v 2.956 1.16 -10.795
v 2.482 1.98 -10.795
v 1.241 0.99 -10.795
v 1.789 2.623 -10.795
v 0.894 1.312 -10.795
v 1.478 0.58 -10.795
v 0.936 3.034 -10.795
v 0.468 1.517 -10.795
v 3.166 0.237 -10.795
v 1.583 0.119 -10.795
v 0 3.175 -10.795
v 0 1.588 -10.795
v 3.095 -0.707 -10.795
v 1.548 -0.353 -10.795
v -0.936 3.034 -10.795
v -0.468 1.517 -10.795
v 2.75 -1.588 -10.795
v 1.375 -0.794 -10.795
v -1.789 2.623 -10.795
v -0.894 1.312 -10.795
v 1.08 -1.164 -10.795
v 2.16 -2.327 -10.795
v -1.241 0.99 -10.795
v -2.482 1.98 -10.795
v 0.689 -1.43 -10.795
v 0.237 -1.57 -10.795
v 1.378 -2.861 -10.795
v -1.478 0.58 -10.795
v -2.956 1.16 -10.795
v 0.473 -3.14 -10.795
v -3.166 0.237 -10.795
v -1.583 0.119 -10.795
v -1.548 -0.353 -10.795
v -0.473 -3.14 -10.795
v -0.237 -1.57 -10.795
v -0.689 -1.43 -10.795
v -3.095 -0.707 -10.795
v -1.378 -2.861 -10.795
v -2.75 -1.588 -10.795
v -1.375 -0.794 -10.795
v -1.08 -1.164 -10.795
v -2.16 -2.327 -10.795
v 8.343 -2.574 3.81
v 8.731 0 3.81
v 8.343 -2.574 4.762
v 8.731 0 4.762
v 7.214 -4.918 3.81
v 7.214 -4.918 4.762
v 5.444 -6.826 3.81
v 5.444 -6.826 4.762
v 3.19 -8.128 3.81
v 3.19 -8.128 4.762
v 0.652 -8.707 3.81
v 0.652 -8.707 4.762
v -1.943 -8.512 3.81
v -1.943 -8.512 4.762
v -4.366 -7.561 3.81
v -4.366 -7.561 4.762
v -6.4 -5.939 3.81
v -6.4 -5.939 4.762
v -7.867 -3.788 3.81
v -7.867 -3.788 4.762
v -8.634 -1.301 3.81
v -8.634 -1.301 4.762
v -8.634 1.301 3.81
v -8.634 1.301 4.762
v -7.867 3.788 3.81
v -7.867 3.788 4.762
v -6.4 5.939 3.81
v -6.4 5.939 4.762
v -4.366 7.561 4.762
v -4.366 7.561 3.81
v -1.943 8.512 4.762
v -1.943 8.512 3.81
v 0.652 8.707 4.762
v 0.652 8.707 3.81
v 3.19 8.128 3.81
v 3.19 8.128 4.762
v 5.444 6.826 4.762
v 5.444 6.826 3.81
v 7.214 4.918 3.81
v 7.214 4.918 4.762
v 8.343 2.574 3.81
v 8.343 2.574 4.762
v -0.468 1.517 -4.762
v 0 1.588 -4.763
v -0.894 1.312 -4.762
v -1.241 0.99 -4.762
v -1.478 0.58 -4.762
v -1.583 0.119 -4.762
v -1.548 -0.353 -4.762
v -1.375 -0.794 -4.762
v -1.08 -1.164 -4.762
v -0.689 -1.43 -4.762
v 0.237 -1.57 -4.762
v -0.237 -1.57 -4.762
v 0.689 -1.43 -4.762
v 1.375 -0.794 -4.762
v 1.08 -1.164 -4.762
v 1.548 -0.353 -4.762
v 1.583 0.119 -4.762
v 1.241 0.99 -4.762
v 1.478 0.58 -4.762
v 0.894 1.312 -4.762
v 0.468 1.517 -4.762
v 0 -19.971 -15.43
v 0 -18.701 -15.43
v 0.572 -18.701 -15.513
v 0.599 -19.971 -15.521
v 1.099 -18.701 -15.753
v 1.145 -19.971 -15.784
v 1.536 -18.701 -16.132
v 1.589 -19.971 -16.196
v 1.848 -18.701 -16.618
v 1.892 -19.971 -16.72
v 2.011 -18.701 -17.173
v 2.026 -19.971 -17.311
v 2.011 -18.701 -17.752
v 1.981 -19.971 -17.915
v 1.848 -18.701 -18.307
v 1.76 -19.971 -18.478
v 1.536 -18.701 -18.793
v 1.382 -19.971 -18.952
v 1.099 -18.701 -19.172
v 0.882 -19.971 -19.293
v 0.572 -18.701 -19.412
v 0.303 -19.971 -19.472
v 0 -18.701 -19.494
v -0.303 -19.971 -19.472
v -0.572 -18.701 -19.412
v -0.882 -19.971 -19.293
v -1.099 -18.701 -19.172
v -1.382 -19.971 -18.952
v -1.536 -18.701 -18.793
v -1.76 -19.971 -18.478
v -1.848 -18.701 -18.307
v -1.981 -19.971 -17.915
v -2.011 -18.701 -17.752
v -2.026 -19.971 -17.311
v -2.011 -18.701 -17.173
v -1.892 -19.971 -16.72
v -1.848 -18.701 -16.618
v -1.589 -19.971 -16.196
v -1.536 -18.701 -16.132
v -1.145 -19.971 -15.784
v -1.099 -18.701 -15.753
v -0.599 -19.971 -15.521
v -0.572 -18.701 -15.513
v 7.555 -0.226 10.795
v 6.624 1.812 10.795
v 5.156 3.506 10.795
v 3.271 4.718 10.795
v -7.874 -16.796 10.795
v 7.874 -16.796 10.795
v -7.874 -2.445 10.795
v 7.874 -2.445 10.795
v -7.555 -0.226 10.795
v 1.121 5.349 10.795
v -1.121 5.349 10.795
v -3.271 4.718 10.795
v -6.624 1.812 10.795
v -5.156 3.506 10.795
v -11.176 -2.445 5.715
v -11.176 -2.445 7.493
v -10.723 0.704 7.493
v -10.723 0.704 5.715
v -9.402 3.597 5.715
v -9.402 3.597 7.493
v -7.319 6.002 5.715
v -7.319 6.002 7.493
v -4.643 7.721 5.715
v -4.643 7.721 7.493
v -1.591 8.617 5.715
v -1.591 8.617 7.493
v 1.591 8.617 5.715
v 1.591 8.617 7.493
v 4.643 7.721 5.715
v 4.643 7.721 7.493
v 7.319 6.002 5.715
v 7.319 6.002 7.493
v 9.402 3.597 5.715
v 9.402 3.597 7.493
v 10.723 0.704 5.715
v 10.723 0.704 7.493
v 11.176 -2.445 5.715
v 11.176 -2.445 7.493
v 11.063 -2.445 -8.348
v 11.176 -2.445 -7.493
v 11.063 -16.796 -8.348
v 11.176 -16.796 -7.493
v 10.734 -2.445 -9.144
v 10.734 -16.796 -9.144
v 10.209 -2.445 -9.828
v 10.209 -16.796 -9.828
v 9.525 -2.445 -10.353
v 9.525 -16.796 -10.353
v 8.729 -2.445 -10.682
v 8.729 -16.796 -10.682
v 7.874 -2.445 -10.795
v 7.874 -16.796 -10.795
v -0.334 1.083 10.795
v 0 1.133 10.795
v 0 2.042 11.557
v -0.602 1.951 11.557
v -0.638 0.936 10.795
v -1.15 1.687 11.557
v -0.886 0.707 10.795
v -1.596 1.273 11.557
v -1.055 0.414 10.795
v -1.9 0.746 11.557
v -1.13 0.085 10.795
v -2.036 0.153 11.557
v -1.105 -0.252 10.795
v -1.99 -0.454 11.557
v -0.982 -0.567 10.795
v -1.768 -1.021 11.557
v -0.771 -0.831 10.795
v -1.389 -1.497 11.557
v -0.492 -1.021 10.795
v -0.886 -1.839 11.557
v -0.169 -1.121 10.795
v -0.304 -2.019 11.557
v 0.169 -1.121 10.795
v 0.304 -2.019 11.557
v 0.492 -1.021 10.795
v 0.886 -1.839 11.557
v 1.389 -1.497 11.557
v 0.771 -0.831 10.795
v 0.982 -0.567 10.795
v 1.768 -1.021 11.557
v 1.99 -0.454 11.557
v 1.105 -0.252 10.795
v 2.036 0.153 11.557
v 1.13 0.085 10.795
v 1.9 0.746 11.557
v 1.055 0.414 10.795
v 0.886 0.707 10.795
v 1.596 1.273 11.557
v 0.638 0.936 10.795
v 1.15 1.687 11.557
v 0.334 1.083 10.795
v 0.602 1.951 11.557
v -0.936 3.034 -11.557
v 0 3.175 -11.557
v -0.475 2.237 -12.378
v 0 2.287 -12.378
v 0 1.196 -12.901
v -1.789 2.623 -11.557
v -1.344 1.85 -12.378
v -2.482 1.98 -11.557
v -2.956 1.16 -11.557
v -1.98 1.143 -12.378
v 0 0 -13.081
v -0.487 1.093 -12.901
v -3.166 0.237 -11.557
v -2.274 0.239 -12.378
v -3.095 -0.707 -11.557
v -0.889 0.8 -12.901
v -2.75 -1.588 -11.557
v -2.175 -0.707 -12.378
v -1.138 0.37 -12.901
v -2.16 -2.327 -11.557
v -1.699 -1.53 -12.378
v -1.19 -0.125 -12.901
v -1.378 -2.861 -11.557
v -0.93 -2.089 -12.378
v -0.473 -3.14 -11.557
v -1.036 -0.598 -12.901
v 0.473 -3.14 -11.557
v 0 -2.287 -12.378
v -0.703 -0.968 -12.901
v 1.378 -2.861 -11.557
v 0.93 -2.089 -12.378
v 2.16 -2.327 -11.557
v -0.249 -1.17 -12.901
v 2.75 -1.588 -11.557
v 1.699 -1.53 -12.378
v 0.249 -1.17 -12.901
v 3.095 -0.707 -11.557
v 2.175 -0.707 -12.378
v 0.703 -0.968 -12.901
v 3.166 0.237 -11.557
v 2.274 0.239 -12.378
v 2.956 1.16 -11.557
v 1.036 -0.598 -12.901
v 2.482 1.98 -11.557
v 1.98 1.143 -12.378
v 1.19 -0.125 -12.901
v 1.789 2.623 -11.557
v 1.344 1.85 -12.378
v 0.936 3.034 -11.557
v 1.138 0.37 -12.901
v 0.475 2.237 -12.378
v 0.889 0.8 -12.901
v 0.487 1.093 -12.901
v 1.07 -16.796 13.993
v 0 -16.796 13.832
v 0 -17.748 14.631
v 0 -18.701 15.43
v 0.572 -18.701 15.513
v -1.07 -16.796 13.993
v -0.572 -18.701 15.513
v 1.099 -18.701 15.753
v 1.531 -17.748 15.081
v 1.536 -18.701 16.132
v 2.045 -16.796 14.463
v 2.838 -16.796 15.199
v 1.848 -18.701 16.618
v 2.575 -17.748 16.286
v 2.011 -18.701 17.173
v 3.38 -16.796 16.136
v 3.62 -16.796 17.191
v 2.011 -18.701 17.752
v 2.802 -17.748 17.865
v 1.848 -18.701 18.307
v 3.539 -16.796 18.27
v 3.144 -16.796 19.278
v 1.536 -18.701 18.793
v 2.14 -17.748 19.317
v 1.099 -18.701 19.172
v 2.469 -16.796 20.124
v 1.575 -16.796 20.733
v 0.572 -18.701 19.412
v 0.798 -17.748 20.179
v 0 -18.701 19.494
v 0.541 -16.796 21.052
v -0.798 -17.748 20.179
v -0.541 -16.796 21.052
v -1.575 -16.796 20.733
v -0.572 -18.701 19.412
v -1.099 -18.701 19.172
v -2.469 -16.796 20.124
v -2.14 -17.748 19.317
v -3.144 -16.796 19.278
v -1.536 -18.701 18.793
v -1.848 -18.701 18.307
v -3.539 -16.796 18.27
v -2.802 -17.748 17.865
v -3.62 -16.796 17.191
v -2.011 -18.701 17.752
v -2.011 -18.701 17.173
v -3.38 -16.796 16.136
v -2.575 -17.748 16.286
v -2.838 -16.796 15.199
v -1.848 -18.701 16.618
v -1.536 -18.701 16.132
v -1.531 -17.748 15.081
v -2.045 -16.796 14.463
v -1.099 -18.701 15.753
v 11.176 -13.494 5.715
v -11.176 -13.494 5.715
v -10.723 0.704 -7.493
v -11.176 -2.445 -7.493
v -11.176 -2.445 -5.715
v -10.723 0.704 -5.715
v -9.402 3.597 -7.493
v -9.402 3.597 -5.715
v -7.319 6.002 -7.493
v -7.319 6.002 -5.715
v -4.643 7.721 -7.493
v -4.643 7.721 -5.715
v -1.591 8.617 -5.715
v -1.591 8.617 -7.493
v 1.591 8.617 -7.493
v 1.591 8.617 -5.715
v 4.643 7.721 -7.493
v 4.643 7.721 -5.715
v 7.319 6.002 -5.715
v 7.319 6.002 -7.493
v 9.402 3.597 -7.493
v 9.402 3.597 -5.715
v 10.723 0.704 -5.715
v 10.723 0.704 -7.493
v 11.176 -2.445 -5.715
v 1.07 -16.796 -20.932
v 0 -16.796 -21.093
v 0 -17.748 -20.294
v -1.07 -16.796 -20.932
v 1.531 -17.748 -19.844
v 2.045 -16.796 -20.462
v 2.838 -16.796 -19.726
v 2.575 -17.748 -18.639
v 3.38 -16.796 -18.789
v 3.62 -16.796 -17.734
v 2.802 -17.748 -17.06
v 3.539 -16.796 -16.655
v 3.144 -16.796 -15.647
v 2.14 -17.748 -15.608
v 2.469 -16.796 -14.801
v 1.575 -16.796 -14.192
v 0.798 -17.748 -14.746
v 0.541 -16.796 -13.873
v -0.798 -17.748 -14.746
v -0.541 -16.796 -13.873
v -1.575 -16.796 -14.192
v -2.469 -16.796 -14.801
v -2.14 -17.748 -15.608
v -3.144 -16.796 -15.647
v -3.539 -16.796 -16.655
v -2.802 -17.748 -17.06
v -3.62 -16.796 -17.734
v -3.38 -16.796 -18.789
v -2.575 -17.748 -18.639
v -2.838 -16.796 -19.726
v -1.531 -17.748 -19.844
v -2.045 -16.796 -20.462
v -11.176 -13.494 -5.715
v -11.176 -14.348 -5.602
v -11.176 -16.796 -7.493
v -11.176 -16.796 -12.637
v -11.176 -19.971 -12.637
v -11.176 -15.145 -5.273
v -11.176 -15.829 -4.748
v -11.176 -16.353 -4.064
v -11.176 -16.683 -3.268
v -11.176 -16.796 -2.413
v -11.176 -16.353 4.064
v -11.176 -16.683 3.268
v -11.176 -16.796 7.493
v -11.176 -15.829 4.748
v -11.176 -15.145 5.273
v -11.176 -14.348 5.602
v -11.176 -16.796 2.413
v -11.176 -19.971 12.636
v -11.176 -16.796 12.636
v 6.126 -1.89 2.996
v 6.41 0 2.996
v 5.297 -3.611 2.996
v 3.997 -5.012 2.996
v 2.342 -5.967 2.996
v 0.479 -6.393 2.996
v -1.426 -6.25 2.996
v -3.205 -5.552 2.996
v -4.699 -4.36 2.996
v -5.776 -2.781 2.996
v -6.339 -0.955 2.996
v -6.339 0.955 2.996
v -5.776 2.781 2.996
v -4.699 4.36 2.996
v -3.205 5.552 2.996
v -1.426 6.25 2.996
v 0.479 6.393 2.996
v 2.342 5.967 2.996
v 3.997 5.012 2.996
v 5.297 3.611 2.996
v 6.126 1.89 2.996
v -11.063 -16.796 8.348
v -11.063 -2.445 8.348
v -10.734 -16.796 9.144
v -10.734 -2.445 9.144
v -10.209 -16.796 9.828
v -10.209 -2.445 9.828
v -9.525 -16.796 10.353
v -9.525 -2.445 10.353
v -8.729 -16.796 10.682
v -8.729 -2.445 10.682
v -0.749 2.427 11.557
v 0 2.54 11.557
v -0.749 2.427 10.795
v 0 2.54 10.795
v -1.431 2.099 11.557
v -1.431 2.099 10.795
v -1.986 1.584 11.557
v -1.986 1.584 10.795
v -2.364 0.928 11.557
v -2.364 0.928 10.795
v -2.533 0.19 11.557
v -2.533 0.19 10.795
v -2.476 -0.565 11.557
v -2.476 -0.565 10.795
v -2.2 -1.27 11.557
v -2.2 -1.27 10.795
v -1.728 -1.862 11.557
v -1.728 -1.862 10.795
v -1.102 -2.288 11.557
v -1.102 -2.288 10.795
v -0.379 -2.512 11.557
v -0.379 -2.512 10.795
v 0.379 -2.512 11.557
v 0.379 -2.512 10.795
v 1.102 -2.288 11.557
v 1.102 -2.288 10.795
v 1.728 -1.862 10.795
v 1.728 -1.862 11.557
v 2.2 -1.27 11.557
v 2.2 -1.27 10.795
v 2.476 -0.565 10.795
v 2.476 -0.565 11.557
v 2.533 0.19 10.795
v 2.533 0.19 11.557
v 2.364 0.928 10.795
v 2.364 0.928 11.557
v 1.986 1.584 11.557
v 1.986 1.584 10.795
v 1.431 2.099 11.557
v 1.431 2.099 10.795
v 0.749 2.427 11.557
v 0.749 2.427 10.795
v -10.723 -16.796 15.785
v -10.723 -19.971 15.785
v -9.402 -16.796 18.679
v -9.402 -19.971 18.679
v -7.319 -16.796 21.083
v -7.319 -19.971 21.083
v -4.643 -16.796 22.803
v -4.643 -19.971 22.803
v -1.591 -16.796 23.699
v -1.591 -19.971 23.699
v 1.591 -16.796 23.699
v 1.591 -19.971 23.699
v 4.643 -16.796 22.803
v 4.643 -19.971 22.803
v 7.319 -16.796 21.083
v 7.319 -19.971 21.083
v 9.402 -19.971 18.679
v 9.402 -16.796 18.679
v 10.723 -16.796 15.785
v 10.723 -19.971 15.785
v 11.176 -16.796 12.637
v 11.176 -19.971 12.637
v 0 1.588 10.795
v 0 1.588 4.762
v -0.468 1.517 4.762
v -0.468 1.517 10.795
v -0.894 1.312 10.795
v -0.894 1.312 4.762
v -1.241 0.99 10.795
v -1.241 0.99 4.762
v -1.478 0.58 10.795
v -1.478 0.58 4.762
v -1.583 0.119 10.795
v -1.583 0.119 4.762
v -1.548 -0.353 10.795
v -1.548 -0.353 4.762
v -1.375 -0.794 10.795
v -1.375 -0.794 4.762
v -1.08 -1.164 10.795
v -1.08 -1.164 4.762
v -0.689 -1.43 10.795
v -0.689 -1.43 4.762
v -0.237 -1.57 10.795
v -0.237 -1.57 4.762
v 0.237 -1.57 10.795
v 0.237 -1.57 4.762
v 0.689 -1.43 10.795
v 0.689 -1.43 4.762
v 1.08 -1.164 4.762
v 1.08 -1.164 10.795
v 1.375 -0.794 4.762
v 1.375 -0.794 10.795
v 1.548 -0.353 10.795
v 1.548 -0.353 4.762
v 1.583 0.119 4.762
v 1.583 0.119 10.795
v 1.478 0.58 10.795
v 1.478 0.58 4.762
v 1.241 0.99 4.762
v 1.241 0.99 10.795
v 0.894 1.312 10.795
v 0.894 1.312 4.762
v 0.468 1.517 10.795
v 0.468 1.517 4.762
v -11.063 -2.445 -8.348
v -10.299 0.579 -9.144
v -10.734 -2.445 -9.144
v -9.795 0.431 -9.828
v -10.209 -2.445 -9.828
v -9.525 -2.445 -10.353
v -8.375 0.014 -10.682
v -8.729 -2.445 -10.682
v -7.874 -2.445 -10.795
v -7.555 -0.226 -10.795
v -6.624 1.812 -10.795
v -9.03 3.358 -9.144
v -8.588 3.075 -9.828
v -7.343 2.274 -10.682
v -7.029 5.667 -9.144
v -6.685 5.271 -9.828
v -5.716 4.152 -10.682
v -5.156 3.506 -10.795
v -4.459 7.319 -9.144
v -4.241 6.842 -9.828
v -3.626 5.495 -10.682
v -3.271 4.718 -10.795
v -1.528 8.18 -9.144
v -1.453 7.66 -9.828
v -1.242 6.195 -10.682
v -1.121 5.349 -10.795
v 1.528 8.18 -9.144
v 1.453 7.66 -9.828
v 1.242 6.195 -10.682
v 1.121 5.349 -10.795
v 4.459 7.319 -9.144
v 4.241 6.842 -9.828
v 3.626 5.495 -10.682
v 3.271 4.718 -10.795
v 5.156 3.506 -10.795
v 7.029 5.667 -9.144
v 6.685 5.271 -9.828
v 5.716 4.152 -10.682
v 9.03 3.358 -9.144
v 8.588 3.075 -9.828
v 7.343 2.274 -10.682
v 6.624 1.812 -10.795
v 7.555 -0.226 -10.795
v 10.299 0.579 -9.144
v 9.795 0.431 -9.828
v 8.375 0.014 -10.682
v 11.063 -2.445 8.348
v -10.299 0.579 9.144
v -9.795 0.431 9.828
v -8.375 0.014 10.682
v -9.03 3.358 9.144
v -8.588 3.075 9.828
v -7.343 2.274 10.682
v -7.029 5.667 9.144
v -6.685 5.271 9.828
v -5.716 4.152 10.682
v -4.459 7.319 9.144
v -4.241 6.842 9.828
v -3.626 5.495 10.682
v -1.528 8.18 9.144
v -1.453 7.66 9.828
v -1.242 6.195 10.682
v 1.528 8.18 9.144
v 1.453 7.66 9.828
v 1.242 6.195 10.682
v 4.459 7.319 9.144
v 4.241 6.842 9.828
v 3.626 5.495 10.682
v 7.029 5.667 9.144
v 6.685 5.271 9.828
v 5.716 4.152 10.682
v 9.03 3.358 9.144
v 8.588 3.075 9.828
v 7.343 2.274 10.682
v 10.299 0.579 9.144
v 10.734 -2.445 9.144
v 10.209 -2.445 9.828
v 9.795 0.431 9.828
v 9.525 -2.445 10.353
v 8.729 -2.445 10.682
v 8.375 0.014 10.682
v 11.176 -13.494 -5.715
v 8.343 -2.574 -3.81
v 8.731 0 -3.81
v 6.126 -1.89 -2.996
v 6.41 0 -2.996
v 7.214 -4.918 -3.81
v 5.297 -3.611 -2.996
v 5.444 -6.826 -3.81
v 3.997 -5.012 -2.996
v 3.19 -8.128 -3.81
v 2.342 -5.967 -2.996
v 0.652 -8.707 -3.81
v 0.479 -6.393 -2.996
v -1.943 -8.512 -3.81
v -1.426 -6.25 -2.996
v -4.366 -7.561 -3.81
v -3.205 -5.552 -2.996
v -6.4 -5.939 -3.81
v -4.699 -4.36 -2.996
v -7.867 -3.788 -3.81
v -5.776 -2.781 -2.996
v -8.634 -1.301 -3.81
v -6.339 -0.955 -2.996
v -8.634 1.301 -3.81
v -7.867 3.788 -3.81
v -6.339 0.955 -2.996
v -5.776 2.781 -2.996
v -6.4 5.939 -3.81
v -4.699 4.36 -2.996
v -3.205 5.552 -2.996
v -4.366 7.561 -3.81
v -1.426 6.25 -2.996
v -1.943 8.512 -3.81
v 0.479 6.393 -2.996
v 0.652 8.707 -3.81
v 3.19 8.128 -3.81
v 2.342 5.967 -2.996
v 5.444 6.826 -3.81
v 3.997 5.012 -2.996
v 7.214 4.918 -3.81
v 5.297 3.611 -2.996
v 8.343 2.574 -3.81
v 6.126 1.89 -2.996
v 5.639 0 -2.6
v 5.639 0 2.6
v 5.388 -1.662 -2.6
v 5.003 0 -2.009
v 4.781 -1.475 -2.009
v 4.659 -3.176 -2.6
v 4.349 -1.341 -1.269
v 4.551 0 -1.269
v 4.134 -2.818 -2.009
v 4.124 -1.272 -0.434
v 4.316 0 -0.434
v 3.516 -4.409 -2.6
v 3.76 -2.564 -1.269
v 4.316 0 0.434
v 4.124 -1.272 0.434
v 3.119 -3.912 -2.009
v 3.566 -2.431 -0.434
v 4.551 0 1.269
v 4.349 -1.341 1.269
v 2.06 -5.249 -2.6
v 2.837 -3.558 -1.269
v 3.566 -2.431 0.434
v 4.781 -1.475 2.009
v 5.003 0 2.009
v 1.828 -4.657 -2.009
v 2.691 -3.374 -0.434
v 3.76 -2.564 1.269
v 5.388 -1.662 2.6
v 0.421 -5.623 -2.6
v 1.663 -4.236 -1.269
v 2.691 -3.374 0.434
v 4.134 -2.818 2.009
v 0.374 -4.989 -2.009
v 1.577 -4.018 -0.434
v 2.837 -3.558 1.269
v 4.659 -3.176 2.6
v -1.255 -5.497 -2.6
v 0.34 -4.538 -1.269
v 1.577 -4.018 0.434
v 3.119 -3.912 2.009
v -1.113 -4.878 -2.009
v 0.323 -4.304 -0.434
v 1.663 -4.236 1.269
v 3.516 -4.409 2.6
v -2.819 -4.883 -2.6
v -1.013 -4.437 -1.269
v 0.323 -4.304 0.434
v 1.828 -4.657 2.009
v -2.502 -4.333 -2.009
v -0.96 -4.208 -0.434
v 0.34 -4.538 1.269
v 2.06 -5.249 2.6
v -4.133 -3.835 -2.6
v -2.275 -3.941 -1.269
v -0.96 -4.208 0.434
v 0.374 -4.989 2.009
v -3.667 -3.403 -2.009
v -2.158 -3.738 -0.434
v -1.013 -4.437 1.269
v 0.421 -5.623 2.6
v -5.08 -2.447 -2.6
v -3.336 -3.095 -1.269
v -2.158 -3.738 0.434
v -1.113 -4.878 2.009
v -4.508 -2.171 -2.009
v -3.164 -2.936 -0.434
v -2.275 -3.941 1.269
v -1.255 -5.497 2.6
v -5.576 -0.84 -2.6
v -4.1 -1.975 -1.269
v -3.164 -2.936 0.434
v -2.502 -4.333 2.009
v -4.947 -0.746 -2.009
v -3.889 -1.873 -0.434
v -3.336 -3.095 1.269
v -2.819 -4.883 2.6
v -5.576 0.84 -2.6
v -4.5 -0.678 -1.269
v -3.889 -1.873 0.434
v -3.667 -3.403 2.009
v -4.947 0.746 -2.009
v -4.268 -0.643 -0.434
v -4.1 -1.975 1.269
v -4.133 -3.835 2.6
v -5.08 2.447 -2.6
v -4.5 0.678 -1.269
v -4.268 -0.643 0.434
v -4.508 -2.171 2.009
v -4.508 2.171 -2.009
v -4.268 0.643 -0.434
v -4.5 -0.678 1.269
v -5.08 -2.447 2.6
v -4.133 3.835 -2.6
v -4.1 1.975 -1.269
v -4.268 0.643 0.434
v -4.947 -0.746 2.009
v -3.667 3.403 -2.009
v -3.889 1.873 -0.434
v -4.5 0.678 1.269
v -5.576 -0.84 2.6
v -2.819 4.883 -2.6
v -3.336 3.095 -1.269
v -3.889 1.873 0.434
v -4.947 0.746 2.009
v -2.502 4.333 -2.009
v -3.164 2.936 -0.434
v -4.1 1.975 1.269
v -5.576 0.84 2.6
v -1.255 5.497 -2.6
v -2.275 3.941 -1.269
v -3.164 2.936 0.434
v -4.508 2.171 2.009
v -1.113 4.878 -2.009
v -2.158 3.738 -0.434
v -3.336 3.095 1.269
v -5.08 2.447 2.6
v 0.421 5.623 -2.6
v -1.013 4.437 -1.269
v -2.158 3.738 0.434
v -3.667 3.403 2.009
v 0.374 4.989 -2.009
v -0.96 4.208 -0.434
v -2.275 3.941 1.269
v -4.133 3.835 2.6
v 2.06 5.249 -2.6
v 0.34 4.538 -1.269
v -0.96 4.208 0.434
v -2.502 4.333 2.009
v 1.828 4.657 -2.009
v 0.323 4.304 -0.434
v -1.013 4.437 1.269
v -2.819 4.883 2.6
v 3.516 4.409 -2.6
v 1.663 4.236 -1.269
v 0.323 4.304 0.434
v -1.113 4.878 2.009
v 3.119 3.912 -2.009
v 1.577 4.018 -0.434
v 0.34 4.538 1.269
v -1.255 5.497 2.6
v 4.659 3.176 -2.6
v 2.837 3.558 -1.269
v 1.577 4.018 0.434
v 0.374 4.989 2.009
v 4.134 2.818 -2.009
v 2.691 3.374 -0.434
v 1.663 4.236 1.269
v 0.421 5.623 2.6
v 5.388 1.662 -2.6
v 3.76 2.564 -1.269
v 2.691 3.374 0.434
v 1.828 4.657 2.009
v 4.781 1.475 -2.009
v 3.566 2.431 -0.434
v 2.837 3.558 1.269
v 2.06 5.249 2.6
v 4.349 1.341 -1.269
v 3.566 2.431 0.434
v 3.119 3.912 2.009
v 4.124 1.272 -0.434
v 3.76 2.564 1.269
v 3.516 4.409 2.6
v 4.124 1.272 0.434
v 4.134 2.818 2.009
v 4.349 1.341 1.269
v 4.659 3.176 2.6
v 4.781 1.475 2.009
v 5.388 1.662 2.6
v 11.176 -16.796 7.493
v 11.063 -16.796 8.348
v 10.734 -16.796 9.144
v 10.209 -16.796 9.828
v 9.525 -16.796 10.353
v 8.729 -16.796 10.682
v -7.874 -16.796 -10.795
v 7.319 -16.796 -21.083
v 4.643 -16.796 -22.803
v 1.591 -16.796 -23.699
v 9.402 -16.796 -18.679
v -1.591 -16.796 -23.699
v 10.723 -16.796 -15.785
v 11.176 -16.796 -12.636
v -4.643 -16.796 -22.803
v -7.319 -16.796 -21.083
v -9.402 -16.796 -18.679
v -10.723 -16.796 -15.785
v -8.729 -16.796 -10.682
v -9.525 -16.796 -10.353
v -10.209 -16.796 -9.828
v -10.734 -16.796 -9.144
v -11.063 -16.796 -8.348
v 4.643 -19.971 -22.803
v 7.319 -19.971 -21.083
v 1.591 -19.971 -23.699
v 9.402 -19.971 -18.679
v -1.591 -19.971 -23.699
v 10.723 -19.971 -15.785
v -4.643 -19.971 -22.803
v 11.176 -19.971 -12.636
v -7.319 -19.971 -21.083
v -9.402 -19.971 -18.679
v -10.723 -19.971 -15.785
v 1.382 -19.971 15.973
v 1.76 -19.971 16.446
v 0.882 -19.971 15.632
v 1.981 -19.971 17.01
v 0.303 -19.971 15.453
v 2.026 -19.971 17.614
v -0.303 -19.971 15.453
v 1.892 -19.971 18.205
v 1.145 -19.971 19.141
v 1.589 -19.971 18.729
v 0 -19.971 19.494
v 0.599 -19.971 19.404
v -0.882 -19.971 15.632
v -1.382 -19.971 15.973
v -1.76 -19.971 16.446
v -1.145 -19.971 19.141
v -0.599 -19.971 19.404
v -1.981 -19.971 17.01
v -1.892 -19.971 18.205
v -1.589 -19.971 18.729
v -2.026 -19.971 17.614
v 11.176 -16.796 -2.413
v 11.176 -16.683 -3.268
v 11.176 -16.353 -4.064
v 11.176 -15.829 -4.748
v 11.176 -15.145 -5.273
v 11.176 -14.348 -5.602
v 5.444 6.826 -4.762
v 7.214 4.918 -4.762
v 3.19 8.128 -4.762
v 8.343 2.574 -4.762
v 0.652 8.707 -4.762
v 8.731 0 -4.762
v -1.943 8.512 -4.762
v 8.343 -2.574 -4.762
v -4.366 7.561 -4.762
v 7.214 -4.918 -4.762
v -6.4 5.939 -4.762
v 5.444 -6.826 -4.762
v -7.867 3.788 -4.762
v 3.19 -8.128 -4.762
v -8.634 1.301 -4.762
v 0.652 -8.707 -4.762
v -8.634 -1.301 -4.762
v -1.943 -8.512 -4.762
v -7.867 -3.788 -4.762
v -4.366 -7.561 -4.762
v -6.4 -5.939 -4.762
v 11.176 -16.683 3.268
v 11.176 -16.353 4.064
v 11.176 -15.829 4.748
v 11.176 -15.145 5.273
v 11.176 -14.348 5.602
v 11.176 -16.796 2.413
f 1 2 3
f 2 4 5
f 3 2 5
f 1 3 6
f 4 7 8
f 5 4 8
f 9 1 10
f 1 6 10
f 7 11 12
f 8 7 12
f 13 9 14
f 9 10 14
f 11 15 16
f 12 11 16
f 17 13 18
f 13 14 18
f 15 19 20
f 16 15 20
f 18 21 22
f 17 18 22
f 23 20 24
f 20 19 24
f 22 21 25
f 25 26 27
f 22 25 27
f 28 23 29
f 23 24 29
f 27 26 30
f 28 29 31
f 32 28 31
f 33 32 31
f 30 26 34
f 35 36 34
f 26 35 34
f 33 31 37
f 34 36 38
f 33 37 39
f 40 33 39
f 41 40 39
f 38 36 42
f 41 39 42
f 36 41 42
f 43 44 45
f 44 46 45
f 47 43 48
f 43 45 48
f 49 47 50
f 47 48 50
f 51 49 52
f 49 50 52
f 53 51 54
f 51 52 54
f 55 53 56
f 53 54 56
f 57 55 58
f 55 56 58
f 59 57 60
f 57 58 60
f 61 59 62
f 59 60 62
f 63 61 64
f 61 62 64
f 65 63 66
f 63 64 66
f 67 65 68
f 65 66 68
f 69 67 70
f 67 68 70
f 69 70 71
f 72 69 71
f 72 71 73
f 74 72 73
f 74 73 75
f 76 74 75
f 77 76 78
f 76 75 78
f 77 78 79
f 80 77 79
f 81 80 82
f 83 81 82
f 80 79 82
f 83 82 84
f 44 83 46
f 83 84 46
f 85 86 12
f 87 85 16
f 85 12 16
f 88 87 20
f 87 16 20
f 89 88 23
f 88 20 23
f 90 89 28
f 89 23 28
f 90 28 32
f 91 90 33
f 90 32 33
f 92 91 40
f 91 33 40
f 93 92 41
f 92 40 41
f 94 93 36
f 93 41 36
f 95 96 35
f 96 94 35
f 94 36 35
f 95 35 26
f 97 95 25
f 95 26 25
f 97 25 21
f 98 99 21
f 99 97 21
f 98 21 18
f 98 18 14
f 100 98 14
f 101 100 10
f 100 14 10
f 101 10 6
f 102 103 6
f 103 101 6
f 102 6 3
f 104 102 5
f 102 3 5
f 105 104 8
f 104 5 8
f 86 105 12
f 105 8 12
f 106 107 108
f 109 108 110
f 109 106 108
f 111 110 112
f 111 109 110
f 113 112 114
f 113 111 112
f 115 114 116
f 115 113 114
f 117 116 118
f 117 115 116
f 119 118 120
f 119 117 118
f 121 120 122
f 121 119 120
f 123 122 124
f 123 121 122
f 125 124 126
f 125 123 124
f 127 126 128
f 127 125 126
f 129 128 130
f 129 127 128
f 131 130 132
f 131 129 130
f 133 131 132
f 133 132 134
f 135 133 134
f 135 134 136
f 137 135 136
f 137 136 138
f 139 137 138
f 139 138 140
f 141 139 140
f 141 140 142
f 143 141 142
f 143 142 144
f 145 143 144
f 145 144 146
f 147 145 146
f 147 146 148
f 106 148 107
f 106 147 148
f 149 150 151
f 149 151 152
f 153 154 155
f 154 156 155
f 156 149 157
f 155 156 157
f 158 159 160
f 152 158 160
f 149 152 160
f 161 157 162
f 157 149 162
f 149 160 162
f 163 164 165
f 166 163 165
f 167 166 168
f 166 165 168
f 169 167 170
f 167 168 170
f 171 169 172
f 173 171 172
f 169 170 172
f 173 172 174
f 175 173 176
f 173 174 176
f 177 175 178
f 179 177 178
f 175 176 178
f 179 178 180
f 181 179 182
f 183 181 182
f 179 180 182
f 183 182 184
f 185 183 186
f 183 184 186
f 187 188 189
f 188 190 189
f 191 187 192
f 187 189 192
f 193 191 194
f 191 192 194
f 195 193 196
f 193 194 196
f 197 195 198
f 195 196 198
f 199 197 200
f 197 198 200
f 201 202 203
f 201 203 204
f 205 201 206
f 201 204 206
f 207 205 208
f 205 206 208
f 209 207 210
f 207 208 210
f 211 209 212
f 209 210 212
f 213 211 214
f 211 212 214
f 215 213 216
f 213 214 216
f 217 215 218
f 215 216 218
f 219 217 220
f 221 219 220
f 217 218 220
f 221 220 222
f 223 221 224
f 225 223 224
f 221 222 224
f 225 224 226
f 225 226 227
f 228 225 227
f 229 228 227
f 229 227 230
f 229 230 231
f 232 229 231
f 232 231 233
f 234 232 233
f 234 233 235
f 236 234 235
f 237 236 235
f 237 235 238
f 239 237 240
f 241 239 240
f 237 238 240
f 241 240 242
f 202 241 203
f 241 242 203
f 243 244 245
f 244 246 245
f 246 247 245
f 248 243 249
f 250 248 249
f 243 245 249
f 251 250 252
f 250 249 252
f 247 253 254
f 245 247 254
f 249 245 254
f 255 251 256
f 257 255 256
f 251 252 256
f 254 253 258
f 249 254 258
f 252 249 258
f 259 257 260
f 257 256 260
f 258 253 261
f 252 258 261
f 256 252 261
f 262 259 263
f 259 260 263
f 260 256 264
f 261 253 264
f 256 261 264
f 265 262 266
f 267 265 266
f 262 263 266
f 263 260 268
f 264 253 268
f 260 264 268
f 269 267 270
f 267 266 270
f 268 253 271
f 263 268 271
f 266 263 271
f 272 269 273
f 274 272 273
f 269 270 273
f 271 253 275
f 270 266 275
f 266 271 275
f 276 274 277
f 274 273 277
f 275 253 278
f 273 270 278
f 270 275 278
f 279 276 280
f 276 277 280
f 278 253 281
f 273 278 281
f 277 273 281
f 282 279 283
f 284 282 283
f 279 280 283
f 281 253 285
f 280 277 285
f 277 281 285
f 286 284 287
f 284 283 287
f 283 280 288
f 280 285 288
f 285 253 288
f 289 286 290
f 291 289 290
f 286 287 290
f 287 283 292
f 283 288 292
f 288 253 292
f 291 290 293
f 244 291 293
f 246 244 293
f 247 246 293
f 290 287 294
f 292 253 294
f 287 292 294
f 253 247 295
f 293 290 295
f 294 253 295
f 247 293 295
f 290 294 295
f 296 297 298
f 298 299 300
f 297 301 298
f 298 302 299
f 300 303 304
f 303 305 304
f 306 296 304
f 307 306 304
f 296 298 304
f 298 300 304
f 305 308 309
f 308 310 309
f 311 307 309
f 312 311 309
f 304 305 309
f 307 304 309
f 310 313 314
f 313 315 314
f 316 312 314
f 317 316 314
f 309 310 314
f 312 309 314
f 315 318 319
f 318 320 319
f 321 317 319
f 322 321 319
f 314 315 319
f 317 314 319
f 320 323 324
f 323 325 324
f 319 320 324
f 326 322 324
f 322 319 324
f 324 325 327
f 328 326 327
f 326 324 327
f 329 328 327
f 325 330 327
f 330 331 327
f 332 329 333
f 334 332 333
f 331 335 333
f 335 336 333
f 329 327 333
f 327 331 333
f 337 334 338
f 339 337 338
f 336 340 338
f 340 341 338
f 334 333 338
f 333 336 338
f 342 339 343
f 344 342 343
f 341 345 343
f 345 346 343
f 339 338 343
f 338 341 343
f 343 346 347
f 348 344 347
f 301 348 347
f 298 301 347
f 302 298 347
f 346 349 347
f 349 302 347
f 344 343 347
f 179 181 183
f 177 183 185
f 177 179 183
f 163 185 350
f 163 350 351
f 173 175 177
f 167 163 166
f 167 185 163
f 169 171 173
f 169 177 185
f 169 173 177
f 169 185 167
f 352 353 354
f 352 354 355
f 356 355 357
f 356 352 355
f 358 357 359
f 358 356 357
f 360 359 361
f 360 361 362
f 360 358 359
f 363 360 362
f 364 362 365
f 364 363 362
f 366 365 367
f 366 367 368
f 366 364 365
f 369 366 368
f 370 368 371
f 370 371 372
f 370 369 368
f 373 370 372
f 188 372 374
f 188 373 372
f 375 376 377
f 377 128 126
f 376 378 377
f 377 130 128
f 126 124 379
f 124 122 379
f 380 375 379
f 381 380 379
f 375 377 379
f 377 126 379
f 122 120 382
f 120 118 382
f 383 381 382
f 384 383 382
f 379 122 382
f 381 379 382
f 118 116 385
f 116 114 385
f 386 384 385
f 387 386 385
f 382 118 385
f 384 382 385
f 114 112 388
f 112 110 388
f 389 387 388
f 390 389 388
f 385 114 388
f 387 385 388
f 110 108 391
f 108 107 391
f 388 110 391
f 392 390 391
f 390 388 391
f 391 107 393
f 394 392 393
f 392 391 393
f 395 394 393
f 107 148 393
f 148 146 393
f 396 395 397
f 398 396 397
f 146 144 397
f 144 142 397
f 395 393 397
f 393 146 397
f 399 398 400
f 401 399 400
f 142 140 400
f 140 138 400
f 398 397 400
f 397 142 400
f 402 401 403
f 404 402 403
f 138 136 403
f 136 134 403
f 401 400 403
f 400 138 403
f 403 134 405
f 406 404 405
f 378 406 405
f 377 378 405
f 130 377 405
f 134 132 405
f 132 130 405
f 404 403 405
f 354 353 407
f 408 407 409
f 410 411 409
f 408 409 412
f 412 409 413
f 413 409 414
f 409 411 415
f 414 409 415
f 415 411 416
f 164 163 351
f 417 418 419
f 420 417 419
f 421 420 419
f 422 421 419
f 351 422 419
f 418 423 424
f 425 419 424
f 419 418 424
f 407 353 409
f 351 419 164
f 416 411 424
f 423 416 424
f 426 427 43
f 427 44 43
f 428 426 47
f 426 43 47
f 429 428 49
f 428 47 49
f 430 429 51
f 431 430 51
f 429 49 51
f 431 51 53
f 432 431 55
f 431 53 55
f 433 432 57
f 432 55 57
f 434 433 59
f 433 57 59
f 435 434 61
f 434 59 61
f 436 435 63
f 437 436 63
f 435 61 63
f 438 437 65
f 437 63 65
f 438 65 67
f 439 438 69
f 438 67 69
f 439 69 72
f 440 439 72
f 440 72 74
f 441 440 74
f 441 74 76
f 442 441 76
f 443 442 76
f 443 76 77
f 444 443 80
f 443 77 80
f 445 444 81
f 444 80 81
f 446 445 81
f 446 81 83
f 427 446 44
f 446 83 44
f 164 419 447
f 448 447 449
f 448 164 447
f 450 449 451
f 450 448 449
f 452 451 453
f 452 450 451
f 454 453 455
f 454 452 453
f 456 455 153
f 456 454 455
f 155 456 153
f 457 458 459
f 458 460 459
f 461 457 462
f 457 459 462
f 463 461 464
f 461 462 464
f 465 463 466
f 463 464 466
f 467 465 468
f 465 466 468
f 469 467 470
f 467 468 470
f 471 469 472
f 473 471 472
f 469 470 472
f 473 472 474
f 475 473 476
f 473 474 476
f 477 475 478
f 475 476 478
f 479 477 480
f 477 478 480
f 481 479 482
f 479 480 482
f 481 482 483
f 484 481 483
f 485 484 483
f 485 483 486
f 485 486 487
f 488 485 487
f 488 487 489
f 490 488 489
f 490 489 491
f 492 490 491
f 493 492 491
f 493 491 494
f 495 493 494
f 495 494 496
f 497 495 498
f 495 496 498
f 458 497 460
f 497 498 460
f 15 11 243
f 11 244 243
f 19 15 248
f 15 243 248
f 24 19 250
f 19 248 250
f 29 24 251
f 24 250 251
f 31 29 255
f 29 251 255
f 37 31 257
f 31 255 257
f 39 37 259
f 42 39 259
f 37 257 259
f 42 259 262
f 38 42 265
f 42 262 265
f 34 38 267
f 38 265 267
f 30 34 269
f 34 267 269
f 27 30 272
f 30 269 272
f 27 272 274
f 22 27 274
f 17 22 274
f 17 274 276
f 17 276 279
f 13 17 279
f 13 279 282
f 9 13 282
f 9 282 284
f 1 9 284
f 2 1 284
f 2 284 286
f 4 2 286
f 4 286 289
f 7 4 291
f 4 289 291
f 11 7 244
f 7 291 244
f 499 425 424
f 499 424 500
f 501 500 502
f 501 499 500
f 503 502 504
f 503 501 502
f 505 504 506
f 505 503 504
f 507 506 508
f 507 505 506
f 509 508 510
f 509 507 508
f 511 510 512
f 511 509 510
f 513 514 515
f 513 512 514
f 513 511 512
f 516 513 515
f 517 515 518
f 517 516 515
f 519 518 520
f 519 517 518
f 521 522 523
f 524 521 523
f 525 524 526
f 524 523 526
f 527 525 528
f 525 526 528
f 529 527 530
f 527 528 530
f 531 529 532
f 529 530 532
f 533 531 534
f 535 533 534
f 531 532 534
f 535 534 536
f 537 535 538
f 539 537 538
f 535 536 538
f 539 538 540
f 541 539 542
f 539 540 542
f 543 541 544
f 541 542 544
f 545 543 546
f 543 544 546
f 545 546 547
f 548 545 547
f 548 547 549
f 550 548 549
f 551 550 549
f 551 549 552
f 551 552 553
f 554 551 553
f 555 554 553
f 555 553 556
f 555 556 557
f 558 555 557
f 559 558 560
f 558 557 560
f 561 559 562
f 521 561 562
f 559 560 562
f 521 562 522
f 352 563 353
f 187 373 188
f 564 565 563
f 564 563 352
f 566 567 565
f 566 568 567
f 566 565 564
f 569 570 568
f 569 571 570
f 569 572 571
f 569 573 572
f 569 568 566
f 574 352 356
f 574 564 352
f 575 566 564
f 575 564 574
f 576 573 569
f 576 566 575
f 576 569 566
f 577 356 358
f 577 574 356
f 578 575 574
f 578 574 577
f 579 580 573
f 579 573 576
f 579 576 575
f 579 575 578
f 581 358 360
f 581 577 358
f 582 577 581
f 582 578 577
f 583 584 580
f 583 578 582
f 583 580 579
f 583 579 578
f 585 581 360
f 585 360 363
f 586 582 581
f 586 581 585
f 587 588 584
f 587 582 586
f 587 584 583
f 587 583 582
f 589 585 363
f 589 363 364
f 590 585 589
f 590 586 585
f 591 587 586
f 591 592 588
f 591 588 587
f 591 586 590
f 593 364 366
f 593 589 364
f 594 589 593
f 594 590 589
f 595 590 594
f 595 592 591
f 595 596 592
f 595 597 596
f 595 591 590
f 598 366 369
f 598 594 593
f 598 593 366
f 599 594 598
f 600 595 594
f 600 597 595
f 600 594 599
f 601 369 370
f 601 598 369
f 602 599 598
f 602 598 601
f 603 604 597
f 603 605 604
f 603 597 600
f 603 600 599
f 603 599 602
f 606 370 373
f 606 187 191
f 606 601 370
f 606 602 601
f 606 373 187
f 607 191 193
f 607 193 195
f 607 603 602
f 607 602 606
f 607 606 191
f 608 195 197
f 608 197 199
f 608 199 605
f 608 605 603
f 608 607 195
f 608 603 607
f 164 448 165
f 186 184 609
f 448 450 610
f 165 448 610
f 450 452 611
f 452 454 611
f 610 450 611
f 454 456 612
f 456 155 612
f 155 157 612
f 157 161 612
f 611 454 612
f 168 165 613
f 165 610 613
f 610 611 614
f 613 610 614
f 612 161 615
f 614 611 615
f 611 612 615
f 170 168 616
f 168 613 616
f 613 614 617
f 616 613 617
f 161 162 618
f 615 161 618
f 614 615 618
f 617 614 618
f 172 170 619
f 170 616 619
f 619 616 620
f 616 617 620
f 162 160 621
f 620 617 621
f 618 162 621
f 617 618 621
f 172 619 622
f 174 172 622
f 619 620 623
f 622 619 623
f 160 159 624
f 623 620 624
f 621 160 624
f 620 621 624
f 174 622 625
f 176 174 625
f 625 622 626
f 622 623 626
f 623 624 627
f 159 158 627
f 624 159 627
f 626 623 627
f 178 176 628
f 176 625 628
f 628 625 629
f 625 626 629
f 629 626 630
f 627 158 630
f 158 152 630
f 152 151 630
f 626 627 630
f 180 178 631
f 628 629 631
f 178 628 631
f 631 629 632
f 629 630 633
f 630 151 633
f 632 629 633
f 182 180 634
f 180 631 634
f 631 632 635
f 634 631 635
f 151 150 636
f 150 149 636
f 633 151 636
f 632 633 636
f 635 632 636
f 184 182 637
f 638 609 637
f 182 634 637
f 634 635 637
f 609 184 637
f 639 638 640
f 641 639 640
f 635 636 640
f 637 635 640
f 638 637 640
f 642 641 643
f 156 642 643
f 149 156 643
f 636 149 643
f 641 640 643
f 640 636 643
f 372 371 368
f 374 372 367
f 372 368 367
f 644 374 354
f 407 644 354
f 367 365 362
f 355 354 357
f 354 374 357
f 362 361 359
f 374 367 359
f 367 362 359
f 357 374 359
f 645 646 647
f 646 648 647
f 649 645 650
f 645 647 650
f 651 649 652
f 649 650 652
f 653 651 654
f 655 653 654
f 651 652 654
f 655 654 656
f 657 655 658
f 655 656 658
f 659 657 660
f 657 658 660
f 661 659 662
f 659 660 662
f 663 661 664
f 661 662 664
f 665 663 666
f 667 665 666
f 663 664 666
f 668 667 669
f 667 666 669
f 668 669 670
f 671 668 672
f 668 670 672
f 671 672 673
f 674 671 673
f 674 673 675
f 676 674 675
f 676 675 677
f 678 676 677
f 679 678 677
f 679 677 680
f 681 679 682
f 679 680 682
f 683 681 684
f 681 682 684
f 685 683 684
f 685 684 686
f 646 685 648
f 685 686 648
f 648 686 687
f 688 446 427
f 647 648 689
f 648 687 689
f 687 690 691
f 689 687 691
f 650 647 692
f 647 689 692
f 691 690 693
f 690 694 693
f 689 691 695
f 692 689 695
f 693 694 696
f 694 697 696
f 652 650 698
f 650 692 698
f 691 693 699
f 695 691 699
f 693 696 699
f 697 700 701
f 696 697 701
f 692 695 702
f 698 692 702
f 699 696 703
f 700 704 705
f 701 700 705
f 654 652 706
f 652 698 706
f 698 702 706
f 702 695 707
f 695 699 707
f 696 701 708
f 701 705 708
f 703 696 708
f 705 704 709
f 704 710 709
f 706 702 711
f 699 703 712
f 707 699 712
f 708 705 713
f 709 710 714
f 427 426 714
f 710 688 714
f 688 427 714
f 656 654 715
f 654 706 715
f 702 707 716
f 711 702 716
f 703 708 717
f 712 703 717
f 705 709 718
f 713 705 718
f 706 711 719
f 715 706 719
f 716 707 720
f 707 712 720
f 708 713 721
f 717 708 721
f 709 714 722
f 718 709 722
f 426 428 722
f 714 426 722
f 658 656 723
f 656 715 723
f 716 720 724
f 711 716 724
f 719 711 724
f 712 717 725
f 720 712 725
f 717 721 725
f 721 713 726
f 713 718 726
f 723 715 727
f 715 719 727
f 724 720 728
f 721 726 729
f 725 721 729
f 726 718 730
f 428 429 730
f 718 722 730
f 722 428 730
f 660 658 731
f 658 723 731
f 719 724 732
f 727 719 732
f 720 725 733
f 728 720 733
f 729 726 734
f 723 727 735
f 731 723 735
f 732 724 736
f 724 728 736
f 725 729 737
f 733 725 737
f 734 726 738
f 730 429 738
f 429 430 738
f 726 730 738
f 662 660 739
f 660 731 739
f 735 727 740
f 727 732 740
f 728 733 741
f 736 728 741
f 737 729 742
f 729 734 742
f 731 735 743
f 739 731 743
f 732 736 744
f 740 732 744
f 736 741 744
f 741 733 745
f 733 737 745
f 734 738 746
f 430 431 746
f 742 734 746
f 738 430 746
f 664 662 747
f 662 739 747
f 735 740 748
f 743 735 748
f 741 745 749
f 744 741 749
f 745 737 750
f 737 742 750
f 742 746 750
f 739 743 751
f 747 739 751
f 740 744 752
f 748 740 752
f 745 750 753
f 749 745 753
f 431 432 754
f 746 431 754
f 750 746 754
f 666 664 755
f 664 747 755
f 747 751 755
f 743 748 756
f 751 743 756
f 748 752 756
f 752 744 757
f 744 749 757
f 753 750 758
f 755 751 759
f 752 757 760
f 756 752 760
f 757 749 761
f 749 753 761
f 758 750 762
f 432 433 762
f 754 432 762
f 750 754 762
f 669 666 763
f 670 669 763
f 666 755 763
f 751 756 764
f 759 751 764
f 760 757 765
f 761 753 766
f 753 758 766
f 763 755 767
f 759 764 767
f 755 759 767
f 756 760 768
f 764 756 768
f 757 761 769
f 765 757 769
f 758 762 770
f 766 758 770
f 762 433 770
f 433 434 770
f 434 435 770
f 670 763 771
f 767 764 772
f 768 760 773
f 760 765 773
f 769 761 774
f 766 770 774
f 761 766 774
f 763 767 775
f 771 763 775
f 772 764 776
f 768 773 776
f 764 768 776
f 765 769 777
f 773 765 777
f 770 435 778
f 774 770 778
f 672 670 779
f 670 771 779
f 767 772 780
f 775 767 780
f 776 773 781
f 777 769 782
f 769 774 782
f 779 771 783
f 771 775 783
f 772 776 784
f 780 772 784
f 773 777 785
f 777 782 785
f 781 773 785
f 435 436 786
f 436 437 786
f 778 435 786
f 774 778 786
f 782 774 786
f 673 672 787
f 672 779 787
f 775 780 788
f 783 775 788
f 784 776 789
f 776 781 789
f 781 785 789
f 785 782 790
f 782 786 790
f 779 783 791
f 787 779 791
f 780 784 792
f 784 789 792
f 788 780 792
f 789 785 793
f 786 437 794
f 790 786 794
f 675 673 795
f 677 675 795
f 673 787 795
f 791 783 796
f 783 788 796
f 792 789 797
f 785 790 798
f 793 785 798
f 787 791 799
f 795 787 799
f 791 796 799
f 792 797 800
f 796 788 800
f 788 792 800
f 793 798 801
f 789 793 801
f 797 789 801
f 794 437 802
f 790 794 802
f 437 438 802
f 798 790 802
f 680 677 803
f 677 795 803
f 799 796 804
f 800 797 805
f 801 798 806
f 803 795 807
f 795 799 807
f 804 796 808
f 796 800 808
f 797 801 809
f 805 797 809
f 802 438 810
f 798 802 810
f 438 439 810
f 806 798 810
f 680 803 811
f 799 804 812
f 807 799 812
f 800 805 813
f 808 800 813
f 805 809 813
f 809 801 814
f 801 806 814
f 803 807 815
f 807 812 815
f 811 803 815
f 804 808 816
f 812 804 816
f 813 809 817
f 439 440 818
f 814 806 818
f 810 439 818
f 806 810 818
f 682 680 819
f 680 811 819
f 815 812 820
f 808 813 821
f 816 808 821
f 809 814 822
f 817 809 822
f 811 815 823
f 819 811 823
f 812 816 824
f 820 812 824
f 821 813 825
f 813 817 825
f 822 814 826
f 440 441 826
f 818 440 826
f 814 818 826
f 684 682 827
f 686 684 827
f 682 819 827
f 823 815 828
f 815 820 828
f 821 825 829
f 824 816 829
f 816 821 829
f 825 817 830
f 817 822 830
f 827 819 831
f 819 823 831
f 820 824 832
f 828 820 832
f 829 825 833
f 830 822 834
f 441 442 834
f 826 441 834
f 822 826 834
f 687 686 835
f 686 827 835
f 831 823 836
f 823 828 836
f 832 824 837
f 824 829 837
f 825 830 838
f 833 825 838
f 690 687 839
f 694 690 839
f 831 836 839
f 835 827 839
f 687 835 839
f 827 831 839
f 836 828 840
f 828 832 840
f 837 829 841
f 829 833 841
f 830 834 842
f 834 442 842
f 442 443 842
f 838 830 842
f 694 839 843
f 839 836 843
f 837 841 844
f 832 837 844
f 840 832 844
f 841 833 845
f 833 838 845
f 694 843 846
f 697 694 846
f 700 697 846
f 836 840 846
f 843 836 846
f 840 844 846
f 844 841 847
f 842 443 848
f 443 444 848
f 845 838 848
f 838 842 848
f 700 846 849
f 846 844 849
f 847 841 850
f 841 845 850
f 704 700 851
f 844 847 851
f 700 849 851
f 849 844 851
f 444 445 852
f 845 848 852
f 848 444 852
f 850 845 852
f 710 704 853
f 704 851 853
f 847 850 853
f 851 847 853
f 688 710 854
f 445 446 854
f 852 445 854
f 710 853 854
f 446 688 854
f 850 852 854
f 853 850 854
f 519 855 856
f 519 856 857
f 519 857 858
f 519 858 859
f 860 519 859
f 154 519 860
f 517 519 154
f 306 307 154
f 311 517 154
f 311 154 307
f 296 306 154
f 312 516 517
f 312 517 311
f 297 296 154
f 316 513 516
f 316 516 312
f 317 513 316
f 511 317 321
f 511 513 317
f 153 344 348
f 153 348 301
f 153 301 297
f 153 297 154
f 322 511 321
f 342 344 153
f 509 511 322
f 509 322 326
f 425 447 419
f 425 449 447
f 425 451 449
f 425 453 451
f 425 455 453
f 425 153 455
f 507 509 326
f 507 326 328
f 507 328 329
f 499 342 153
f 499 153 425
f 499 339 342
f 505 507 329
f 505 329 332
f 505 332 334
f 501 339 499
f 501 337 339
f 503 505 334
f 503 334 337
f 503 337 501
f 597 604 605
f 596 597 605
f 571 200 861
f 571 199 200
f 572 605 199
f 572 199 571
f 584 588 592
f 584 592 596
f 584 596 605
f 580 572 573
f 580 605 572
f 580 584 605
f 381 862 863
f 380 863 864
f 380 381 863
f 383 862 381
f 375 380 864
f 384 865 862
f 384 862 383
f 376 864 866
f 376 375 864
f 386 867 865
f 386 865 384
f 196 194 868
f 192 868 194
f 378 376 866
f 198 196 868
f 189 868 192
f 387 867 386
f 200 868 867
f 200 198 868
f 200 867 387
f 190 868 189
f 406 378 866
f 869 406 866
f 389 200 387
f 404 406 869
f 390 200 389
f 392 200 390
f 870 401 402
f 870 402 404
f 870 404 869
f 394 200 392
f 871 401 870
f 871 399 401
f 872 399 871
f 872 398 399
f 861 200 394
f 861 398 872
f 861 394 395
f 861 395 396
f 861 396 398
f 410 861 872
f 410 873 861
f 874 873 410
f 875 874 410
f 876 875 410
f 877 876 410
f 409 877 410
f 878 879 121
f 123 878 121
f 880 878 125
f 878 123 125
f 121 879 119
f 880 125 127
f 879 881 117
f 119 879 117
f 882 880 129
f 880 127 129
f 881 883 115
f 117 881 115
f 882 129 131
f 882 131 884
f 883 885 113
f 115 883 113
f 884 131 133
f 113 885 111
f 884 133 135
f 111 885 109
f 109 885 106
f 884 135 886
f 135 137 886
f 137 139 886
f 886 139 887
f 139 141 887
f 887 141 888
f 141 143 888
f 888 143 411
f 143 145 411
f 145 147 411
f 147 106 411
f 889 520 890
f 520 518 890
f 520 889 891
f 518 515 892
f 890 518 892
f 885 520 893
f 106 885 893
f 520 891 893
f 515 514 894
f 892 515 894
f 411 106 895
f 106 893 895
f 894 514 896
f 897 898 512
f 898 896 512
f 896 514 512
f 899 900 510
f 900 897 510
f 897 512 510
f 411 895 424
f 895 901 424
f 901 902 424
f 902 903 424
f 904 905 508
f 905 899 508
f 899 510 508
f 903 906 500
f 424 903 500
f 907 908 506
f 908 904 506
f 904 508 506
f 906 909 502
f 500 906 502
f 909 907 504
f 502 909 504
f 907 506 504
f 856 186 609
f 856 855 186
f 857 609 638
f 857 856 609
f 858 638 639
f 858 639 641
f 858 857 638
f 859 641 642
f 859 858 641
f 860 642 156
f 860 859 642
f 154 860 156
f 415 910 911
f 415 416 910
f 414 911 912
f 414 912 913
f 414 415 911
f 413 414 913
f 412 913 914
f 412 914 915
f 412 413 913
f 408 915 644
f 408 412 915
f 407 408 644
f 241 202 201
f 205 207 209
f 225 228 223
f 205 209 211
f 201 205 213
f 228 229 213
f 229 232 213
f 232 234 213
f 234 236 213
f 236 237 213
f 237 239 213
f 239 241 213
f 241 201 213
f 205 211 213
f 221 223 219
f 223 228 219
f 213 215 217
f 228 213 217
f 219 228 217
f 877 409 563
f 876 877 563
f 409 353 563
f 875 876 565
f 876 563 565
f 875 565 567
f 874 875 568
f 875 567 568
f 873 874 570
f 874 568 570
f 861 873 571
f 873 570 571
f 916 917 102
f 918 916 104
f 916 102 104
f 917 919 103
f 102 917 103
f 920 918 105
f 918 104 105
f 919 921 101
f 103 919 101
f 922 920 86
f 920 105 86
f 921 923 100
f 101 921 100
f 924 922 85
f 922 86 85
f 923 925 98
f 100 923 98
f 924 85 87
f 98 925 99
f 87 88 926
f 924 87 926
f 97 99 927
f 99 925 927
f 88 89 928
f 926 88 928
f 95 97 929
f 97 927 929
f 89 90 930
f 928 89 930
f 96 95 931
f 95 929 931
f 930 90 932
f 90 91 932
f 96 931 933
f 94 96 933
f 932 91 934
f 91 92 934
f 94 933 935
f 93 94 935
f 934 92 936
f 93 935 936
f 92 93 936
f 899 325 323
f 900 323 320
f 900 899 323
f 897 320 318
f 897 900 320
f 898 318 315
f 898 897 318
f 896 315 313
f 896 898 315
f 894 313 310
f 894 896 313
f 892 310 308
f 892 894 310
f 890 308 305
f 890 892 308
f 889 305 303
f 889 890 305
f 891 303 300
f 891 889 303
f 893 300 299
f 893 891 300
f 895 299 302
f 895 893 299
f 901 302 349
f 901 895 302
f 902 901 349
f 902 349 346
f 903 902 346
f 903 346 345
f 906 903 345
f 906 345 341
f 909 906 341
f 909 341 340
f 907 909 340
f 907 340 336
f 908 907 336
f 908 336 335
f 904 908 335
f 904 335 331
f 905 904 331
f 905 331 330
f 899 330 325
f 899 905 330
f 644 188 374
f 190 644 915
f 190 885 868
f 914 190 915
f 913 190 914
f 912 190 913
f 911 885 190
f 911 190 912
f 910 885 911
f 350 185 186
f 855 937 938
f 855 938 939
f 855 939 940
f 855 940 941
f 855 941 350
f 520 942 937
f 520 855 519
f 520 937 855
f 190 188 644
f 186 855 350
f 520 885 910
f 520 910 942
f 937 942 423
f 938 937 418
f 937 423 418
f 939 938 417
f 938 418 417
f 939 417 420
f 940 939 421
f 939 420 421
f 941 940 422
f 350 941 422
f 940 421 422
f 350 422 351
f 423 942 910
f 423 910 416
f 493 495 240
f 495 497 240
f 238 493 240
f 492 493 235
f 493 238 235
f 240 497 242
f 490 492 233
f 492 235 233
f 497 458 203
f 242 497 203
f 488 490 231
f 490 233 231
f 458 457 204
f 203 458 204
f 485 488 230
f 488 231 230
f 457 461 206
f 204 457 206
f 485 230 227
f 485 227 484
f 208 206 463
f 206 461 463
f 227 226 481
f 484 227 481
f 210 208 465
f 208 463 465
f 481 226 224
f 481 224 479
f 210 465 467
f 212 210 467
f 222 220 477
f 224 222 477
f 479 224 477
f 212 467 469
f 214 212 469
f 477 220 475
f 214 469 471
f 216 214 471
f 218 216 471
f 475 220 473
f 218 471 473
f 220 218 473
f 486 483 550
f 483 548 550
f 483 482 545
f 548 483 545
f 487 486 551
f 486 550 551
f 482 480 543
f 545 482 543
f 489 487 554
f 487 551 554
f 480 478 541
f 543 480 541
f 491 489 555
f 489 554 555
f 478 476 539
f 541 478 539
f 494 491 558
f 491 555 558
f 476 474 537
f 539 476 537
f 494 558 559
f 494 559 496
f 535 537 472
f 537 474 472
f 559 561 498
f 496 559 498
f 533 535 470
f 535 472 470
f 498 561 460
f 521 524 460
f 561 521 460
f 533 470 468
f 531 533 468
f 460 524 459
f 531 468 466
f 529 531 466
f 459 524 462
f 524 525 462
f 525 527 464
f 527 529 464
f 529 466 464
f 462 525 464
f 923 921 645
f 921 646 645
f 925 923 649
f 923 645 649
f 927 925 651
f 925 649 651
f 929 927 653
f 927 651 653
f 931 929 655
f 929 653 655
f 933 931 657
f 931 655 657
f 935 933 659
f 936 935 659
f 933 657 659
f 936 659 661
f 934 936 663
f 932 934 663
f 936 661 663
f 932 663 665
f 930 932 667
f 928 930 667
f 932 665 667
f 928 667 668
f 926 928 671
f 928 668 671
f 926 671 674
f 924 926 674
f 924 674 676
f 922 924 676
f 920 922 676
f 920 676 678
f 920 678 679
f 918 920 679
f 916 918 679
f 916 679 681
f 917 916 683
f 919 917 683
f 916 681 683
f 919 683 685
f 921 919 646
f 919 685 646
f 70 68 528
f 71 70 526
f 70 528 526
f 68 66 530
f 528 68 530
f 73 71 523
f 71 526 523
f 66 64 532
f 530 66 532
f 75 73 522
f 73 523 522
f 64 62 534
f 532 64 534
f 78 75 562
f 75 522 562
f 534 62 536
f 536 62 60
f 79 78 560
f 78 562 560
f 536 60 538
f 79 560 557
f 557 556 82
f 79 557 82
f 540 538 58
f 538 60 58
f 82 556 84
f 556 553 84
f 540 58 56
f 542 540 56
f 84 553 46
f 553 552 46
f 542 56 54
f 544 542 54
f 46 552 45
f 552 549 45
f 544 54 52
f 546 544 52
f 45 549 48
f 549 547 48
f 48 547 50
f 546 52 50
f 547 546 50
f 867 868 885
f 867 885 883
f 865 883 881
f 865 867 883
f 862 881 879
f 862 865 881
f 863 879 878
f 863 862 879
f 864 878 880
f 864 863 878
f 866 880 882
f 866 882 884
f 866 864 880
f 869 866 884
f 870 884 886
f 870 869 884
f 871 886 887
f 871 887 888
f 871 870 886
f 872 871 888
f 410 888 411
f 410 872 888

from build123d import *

# Parameters (mm, degrees)
SKETCH4_W                    = 22.352
SKETCH4_H                    = 47.625
SKETCH4_R                    = 2.032
BOSS_EXTRUDE1_DEPTH          = 3.175
SKETCH8_R                    = 2.032
CUT_EXTRUDE2_DEPTH           = 1.905
CUT_EXTRUDE2_DRAFT           = 40
CUT_EXTRUDE2_PROFILE_2_DEPTH = 1.905
CUT_EXTRUDE2_PROFILE_2_DRAFT = 40
BOSS_EXTRUDE2_DEPTH          = 5.08
FILLET1_R                    = 3.302
SKETCH7_OUTSIDE_W            = 36.338
SKETCH7_OUTSIDE_H            = 61.612
CUT_EXTRUDE1_DEPTH           = 34.02679197


with BuildPart() as part:
    # Sketch3 → Revolve1 (revolve)
    with BuildSketch(Plane(origin=(0, 0, 0), x_dir=(0, 0, -1), z_dir=(1, 0, 0)), mode=Mode.PRIVATE) as revolve1_sk:
        with BuildLine():
            Line((-4.7625, 8.73125), (-4.7625, 0))
            Line((-4.7625, 0), (4.7625, 0))
            Line((4.7625, 0), (4.7625, 8.73125))
            Line((4.7625, 8.73125), (3.81, 8.73125))
            Line((3.81, 8.73125), (2.996086106, 6.410491681))
            ThreePointArc((2.996086106, 6.410491681), (0, 4.28625), (-2.996086106, 6.410491681))
            Line((-2.996086106, 6.410491681), (-3.81, 8.73125))
            Line((-3.81, 8.73125), (-4.7625, 8.73125))
        make_face()
    revolve(revolve1_sk.sketch.rotate(Axis((0, 0, 4.7625), (0, 0, -1)), 90), axis=Axis((0, 0, 4.7625), (0, 0, -1)))

    # Sketch6 → Revolve2 (revolve)
    with BuildSketch(Plane(origin=(0, 0, 0), x_dir=(0, 0, -1), z_dir=(1, 0, 0))):
        with BuildLine():
            Line((-10.795, 1.5875), (10.795, 1.5875))
            Line((10.795, 1.5875), (10.795, 3.175))
            Line((10.795, 3.175), (11.557, 3.175))
            ThreePointArc((11.557, 3.175), (12.680268598, 1.760908927), (13.081, 0))
            Line((13.081, 0), (-10.795, 0))
            Line((-10.795, 0), (-10.795, 1.133441881))
            Line((-10.795, 1.133441881), (-11.557, 2.041558119))
            Line((-11.557, 2.041558119), (-11.557, 2.54))
            Line((-11.557, 2.54), (-10.795, 2.54))
            Line((-10.795, 2.54), (-10.795, 1.5875))
        make_face()
    revolve(axis=Axis((0, 0, -13.081), (0, 0, 1)))


with BuildPart() as body_2:
    # Sketch4 → Boss-Extrude1 (new body)
    with BuildSketch(Plane(origin=(0, -19.97075, 0), x_dir=(-1, 0, 0), z_dir=(0, 1, 0))):
        Rectangle(SKETCH4_W, SKETCH4_H)
        with Locations(Location((0, 17.4625, 0), (0, 0, 90))):
            Circle(SKETCH4_R, mode=Mode.SUBTRACT)
        with Locations(Location((0, -17.4625, 0), (0, 0, 90))):
            Circle(SKETCH4_R, mode=Mode.SUBTRACT)
    extrude(amount=BOSS_EXTRUDE1_DEPTH)


with BuildPart() as cut_extrude2_tool:
    # Sketch8 → Cut-Extrude2 (with draft: the straight prism first)
    with BuildSketch(Plane.XZ.offset(18.70075)):
        with Locations(Location((0, -17.4625, 0), (0, 0, 270))):
            Circle(SKETCH8_R)
    extrude(amount=-CUT_EXTRUDE2_DEPTH)
    # Cut-Extrude2: the draft: its side faces are tilted about the plane it starts from
    cut_extrude2_sides = [cut_extrude2_tool.faces().sort_by_distance(p)[0] for p in [
        (0, -17.74825, -15.4305),
    ]]
    draft(cut_extrude2_sides, Plane.XZ.offset(18.70075), CUT_EXTRUDE2_DRAFT)


with BuildPart() as body_2_1:
    add(body_2.part)

    # Cut-Extrude2: cut by cut_extrude2_tool
    add(cut_extrude2_tool.part, mode=Mode.SUBTRACT)


with BuildPart() as cut_extrude2_profile_2_tool:
    # Sketch8 → Cut-Extrude2 profile 2 (with draft: the straight prism first)
    with BuildSketch(Plane.XZ.offset(18.70075)):
        with Locations(Location((0, 17.4625, 0), (0, 0, 270))):
            Circle(SKETCH8_R)
    extrude(amount=-CUT_EXTRUDE2_PROFILE_2_DEPTH)
    # Cut-Extrude2 profile 2: the draft: its side faces are tilted about the plane it starts from
    cut_extrude2_profile_2_sides = [cut_extrude2_profile_2_tool.faces().sort_by_distance(p)[0] for p in [
        (0, -17.74825, 19.4945),
    ]]
    draft(cut_extrude2_profile_2_sides, Plane.XZ.offset(18.70075), CUT_EXTRUDE2_PROFILE_2_DRAFT)


with BuildPart() as body_2_2:
    add(body_2_1.part)

    # Cut-Extrude2 profile 2: cut by cut_extrude2_profile_2_tool
    add(cut_extrude2_profile_2_tool.part, mode=Mode.SUBTRACT)

    # Sketch5 → Boss-Extrude2 (add)
    with BuildSketch(Plane(origin=(0.1984375, 0, 10.795), x_dir=(-1, 0, 0), z_dir=(0, 0, -1))):
        with BuildLine():
            Line((-10.9775625, -2.44475), (-10.9775625, -16.79575))
            Line((-10.9775625, -16.79575), (11.3744375, -16.79575))
            Line((11.3744375, -16.79575), (11.3744375, -2.44475))
            ThreePointArc((11.3744375, -2.44475), (0.1984375, 8.73125), (-10.9775625, -2.44475))
        make_face()
    boss_extrude2 = extrude(amount=BOSS_EXTRUDE2_DEPTH)

    # Mirror1: Boss-Extrude2 across plane
    add(boss_extrude2.mirror(Plane.XY))

    # Fillet1
    fillet1_edges = [body_2_2.edges().sort_by_distance(p)[0] for p in [
        (11.176, -9.62025, 10.795),
        (0, 8.73125, 10.795),
        (-11.176, -9.62025, 10.795),
        (-11.176, -9.62025, -10.795),
        (11.176, -9.62025, -10.795),
        (0, 8.73125, -10.795),
        (0, -16.79575, 5.715),
        (0, -16.79575, -5.715),
    ]]
    fillet(fillet1_edges, radius=FILLET1_R)

    # Sketch7 outside → Cut-Extrude1 (cut, through all)
    with BuildSketch(Plane(origin=(0, 0, 0), x_dir=(1, 0, 0), z_dir=(0, 1, 0))):
        Rectangle(SKETCH7_OUTSIDE_W, SKETCH7_OUTSIDE_H)
        with BuildLine():
            Line((-11.176, 12.6365), (-11.176, -12.6365))
            ThreePointArc((-11.176, -12.6365), (0, -23.8125), (11.176, -12.6365))
            Line((11.176, -12.6365), (11.176, 12.6365))
            ThreePointArc((11.176, 12.6365), (0, 23.8125), (-11.176, 12.6365))
        make_face(mode=Mode.SUBTRACT)
    extrude(amount=-CUT_EXTRUDE1_DEPTH, mode=Mode.SUBTRACT)


solid = Compound([part.part, body_2_2.part])
